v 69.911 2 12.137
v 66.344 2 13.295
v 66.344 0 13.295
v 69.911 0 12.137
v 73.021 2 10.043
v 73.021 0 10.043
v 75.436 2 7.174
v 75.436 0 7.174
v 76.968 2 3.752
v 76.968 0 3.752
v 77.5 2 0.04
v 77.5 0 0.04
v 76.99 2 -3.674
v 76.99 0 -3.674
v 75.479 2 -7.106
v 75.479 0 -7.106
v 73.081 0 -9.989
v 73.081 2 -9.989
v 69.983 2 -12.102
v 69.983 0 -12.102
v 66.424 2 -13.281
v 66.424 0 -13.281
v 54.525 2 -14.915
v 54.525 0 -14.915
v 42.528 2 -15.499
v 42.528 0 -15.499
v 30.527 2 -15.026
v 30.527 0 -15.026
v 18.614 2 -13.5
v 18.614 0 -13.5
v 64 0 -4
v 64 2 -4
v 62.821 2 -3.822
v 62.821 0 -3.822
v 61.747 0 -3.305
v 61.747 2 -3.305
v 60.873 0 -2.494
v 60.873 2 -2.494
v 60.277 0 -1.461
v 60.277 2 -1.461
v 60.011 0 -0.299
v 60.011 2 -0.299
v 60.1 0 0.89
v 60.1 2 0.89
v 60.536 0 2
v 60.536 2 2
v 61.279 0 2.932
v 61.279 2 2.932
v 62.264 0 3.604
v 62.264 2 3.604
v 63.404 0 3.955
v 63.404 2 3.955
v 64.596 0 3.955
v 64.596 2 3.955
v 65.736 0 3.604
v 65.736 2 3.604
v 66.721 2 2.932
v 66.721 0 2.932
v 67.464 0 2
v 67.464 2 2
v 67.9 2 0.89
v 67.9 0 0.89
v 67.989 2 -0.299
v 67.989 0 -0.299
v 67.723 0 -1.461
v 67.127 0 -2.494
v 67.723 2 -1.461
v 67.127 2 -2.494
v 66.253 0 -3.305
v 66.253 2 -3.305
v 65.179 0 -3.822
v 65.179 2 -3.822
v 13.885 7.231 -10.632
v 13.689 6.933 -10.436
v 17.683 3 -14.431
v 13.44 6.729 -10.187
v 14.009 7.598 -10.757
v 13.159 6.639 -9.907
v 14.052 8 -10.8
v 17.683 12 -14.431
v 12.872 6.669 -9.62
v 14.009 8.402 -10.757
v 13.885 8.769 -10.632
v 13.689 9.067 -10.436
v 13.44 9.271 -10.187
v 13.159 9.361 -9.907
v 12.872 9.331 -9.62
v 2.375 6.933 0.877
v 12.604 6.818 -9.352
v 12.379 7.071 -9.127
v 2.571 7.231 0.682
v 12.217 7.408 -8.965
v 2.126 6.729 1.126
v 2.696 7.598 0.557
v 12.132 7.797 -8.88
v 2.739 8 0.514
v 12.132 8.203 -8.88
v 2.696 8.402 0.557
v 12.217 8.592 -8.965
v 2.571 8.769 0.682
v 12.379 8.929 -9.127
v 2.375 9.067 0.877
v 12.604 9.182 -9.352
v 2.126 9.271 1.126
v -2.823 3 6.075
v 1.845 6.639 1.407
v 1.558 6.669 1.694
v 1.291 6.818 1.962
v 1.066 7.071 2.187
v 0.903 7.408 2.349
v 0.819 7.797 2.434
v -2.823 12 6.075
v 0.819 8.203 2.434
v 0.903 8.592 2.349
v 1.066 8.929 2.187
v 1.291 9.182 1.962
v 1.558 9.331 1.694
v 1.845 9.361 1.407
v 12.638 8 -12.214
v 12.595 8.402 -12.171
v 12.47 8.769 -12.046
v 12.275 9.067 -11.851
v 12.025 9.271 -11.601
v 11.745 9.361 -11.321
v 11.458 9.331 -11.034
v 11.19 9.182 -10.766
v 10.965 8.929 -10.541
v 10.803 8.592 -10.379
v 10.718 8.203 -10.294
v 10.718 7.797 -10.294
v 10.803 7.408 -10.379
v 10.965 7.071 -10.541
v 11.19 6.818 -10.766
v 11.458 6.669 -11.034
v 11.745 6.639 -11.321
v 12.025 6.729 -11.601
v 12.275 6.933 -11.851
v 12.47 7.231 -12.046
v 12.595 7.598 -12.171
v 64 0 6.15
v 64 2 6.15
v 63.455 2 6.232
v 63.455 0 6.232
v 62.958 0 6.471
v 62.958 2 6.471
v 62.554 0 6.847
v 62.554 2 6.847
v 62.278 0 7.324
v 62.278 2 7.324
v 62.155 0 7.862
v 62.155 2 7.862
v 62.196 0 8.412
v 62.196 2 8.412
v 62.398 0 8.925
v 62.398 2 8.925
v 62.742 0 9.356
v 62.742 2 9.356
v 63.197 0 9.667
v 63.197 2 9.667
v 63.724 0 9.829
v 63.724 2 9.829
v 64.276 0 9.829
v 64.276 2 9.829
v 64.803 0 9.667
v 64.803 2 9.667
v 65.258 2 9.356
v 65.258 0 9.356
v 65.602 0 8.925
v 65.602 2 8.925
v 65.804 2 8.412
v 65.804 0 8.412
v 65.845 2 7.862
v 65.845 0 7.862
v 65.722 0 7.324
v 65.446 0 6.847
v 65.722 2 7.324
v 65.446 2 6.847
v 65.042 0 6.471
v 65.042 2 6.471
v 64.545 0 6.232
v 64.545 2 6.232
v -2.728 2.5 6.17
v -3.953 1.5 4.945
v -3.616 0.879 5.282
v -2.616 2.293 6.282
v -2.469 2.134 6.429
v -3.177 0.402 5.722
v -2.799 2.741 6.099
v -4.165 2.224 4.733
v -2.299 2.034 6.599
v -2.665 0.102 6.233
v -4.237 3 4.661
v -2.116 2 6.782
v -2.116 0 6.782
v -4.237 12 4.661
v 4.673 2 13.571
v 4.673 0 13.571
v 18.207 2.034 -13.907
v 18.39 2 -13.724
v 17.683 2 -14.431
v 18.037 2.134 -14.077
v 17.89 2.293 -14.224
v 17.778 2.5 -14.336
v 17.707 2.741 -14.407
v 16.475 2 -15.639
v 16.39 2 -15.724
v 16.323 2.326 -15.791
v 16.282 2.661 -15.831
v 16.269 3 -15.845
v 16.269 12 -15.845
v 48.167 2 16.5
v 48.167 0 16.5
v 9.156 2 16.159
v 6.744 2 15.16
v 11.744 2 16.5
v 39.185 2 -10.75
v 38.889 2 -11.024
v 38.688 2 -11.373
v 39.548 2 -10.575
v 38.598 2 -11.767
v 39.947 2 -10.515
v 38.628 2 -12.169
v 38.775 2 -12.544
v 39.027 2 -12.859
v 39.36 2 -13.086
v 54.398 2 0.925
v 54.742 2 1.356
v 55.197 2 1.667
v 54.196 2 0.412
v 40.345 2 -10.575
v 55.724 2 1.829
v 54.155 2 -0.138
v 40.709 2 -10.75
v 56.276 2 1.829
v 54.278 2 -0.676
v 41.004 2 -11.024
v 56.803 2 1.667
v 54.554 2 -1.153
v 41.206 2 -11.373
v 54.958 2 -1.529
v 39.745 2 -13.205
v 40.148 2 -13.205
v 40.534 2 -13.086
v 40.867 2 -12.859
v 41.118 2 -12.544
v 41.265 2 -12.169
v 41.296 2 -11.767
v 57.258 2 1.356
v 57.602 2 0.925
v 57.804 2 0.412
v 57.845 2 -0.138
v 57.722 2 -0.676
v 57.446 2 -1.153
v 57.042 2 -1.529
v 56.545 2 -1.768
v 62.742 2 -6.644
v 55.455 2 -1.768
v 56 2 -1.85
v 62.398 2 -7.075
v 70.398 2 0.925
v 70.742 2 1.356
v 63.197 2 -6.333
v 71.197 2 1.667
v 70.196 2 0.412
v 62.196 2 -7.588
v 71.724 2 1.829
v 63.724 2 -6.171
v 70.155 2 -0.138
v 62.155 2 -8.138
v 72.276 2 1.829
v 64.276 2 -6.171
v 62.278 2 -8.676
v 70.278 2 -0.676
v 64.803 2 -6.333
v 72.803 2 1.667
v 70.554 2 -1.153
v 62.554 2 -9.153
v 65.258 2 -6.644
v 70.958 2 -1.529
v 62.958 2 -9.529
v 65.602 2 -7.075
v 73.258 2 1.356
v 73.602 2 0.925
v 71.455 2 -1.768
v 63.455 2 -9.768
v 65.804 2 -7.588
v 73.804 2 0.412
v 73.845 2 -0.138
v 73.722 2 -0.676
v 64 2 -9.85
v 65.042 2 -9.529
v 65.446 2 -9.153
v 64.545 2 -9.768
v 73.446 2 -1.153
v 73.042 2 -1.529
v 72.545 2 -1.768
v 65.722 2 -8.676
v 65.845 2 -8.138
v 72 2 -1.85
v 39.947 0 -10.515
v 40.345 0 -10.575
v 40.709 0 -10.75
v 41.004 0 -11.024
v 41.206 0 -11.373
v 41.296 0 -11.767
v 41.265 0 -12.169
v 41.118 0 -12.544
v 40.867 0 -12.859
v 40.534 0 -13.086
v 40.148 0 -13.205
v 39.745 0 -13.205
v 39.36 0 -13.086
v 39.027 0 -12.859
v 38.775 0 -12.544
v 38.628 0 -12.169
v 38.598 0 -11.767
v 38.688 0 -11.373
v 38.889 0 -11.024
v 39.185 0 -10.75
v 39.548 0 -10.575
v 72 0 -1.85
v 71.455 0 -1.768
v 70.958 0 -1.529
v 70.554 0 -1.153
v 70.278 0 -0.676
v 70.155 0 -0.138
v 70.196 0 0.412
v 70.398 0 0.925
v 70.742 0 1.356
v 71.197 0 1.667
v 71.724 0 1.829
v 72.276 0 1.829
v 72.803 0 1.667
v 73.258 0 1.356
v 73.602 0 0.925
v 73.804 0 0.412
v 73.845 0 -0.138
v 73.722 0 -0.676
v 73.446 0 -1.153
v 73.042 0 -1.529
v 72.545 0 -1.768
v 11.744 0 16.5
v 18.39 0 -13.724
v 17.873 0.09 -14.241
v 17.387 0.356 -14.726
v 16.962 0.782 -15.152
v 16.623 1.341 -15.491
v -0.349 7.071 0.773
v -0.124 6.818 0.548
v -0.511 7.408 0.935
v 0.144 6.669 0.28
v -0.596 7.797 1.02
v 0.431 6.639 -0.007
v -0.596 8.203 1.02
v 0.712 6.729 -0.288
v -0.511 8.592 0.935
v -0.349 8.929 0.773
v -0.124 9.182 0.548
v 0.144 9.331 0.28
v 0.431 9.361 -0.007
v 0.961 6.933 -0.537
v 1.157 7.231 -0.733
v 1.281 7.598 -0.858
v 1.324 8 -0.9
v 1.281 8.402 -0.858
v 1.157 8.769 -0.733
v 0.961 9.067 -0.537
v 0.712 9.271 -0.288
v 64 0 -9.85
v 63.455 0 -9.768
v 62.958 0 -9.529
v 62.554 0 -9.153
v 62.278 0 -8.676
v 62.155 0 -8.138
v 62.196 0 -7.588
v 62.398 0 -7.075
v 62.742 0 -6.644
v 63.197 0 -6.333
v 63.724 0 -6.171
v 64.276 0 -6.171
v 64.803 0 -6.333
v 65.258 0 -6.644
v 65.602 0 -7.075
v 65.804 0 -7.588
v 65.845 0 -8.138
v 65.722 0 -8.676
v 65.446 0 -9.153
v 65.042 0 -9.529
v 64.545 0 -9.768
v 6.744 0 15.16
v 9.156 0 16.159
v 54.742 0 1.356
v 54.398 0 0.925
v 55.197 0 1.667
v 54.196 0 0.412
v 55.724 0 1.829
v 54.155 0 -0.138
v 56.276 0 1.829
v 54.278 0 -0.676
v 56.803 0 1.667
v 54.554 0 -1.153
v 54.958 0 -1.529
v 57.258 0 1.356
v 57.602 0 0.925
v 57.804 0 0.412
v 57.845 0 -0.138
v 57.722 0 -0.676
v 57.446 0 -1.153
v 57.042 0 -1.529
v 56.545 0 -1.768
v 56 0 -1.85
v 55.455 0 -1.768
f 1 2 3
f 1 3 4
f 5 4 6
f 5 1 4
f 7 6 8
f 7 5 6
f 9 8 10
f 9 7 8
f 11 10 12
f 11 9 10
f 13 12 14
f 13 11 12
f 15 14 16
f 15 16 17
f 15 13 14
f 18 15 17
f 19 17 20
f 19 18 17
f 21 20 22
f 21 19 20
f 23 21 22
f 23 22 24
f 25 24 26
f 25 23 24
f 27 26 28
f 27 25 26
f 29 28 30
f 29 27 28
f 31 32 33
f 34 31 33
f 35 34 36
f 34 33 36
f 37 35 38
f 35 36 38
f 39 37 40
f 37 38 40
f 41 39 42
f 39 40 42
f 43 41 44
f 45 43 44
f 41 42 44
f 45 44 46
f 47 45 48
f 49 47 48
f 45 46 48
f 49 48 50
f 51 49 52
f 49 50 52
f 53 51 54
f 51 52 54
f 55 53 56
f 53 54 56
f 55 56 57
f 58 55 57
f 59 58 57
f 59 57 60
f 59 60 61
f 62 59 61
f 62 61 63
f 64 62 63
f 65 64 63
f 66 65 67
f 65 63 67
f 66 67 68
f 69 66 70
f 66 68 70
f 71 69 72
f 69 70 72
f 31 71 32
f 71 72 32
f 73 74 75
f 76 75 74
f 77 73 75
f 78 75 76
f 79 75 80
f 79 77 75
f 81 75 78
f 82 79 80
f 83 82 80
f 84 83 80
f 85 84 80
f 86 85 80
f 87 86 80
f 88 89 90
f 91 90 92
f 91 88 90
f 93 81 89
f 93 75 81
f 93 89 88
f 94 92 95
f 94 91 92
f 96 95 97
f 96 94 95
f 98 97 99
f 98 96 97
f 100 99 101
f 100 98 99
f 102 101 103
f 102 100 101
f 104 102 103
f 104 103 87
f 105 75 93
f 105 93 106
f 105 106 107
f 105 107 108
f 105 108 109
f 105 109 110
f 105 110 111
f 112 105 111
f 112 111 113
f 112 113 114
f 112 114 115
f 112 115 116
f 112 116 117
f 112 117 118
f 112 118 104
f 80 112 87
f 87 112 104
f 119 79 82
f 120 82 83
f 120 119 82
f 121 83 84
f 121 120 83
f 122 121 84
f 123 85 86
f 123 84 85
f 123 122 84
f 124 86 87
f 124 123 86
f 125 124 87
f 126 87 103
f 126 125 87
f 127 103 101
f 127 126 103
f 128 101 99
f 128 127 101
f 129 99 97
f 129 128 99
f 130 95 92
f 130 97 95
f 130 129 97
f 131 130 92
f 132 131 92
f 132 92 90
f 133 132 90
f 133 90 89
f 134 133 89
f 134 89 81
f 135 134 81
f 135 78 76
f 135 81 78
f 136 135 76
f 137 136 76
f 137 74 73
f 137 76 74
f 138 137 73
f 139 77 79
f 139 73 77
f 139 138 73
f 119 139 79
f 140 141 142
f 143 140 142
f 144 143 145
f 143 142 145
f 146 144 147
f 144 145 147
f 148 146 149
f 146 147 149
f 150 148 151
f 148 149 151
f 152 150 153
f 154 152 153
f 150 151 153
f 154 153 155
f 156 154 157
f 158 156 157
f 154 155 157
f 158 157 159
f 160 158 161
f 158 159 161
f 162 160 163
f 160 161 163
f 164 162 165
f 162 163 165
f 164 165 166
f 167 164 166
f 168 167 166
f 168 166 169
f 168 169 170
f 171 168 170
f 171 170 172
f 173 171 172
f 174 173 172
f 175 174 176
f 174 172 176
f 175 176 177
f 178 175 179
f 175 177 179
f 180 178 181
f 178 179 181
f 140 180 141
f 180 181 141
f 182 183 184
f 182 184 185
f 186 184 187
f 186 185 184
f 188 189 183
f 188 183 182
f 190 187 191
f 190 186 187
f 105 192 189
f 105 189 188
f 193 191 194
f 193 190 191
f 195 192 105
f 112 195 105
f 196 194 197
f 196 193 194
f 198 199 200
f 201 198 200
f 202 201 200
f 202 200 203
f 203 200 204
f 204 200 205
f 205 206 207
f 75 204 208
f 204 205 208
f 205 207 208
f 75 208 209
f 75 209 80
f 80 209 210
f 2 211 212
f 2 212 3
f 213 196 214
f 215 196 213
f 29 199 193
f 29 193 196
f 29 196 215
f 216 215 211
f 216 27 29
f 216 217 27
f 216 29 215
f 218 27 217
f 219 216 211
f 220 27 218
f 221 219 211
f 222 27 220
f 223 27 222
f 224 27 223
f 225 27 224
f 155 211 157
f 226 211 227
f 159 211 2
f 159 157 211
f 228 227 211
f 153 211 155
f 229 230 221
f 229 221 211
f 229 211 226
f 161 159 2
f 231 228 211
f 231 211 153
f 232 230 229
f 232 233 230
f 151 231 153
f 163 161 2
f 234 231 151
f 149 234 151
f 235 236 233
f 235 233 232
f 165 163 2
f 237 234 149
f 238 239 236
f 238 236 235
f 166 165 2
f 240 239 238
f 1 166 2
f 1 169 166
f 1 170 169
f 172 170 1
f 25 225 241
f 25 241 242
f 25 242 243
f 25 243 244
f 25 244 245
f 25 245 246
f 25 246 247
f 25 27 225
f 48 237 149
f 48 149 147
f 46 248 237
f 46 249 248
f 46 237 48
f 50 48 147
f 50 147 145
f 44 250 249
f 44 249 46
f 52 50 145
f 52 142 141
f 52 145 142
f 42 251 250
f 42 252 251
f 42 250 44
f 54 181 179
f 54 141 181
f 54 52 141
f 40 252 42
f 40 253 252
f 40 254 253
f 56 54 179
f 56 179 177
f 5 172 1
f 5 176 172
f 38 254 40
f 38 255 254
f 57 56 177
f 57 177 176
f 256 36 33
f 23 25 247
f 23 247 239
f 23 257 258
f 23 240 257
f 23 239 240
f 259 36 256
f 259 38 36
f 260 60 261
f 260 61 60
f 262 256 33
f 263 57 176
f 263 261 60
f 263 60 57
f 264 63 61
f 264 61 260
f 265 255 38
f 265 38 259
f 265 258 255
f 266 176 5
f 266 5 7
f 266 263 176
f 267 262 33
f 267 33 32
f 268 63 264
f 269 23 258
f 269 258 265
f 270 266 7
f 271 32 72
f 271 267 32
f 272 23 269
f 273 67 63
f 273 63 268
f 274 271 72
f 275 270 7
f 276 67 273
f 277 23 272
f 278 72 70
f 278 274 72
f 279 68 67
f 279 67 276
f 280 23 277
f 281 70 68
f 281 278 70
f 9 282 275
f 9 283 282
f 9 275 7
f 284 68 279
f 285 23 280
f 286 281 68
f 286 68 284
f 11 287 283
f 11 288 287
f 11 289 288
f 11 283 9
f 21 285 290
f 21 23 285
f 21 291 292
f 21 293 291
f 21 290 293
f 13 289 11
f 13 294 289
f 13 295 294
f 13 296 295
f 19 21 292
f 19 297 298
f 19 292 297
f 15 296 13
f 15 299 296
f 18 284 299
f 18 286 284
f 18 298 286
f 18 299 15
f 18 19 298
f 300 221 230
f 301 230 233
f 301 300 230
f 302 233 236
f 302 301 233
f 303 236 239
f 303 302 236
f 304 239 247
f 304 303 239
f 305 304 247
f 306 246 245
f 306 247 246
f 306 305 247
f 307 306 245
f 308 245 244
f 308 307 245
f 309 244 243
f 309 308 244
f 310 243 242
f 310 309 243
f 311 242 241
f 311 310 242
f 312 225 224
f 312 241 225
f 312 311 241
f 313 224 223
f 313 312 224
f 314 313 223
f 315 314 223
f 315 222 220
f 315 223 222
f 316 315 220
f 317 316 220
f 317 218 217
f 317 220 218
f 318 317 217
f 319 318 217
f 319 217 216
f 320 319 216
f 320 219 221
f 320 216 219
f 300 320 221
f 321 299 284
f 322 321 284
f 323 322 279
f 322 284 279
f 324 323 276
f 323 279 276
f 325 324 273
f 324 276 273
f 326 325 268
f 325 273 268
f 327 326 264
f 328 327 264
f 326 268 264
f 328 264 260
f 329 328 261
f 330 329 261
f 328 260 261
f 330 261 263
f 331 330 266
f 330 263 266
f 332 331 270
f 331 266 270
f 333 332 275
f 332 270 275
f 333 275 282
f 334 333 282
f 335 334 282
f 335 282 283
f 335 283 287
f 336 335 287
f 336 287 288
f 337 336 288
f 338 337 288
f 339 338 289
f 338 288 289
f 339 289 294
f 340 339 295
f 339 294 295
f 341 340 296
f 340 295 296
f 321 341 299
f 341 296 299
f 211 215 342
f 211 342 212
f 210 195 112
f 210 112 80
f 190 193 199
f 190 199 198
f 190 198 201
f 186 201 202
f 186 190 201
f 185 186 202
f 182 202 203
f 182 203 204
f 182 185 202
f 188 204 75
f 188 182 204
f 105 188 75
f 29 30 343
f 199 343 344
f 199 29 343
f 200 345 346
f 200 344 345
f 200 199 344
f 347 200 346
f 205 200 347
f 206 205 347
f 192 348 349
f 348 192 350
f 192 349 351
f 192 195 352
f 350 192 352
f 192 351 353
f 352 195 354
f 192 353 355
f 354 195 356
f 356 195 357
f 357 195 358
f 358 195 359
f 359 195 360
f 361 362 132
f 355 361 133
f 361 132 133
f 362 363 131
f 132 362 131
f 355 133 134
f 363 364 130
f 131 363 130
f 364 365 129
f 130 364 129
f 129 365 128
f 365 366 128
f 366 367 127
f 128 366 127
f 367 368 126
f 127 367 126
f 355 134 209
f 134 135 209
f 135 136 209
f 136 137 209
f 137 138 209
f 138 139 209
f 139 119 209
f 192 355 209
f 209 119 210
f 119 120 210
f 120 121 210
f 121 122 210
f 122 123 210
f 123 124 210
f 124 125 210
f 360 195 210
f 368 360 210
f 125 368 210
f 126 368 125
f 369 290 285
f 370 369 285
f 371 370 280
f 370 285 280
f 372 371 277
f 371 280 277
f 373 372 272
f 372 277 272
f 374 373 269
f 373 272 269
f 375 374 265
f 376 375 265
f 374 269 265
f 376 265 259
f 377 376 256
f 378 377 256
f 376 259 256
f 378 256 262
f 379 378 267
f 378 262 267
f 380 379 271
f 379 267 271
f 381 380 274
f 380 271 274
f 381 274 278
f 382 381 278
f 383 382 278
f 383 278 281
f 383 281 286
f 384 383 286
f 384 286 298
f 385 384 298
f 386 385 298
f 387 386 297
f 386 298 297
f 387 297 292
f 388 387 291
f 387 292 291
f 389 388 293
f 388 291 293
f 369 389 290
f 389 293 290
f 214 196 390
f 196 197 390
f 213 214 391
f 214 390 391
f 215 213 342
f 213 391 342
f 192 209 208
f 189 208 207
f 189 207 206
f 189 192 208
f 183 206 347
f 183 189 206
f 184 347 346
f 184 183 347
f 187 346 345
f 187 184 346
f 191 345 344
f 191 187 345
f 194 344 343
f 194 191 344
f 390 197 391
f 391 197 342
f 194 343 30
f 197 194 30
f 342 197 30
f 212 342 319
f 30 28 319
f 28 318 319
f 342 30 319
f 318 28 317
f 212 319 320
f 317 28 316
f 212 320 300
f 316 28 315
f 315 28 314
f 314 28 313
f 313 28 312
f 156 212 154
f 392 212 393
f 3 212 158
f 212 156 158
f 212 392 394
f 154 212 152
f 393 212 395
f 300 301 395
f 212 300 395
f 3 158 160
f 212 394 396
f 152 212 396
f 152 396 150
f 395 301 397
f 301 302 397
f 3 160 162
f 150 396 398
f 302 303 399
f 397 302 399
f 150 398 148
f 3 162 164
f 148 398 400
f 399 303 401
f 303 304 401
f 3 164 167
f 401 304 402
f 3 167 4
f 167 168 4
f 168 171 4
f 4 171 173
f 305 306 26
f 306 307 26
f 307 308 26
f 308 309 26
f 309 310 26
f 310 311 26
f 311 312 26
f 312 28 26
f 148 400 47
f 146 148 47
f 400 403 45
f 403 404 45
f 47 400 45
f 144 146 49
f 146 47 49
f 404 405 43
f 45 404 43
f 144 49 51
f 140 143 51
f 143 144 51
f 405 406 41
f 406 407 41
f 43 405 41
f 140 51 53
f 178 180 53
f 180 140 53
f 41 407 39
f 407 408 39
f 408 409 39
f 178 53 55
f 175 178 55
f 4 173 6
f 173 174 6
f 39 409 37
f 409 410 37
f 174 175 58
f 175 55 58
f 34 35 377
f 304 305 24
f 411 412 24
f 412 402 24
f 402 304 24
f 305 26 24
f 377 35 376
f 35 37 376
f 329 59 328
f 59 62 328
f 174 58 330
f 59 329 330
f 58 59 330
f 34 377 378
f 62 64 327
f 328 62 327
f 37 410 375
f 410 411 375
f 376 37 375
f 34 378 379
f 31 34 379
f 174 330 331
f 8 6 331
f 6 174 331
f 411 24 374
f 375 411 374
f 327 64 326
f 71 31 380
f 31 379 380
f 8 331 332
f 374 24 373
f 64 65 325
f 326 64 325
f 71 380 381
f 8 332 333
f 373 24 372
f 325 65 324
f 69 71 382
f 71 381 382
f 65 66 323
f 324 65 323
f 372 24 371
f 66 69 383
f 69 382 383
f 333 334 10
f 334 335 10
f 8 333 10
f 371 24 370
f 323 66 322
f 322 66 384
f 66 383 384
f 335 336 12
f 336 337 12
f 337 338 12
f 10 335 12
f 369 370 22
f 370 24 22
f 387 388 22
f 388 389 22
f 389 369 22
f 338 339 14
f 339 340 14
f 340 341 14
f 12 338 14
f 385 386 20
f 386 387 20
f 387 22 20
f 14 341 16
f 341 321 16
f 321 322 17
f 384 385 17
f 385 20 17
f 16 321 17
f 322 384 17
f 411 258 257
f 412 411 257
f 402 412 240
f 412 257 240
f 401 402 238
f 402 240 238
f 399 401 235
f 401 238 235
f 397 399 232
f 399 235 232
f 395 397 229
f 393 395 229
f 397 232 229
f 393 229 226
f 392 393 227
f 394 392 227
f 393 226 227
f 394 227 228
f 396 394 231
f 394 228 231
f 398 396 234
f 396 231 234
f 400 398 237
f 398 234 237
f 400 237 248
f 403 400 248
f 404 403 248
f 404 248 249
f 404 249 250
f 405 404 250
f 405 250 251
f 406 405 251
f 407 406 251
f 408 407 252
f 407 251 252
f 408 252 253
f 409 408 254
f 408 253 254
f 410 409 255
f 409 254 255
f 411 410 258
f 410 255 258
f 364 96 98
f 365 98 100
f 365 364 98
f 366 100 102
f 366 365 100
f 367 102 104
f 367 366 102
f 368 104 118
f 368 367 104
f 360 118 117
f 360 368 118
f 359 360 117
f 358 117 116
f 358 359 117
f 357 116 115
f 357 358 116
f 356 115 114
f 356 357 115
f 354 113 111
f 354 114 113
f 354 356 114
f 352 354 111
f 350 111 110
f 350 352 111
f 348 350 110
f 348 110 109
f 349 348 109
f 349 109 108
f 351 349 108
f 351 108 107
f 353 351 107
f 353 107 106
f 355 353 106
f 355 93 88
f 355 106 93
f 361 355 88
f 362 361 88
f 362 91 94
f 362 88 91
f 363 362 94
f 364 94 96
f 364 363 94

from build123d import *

# Parameters (mm, degrees)
SKETCH1_R                  = 1.85
SKETCH1_R_2                = 4
BOSS_EXTRUDE1_DEPTH        = 2
BOSS_EXTRUDE3_DEPTH        = 10
SKETCH12_R                 = 1.36525
CUT_EXTRUDE2_DEPTH         = 3
SKETCH14_R                 = 1.35255
CUT_EXTRUDE3_DEPTH         = 6
FILLET1_R                  = 10
FLATTEN_BENDS1_START       = 2
FLATTEN_BENDS1_DEPTH       = 10
FLATTEN_BENDS1_2_OUTLINE_R = 1.36525
FLATTEN_BENDS1_2_DEPTH     = 2
PROCESS_BENDS1_START       = -8.401979777
PROCESS_BENDS1_OUTLINE_W   = 29
PROCESS_BENDS1_OUTLINE_H   = 2
PROCESS_BENDS1_DEPTH       = 8.701769682
PROCESS_BENDS1_START_2     = 0.591569905
PROCESS_BENDS1_2_OUTLINE_W = 29
PROCESS_BENDS1_2_OUTLINE_H = 10
PROCESS_BENDS1_2_OUTLINE_R = 1.36525
PROCESS_BENDS1_2_DEPTH     = 1.70822
PROCESS_BENDS1_START_3     = 0.299789905
PROCESS_BENDS1_3_OUTLINE_W = 29
PROCESS_BENDS1_3_OUTLINE_H = 10
PROCESS_BENDS1_3_OUTLINE_R = 1.36525
PROCESS_BENDS1_3_DEPTH     = 3
PROCESS_BENDS1_START_4     = -6.292093187
PROCESS_BENDS1_4_DEPTH     = 29


with BuildPart() as part:
    # Sketch1 → Boss-Extrude1 (new body)
    with BuildSketch(Plane(origin=(0, 2, 0), x_dir=(1, 0, 0), z_dir=(0, 1, 0))):
        with BuildLine():
            Line((16.268898369, 15.844931419), (-4.237198285, -4.661165235))
            Line((-4.237198285, -4.661165235), (7.60163648, -16.5))
            Line((7.60163648, -16.5), (48.167251499, -16.5))
            Line((48.167251499, -16.5), (66.344250399, -13.294904666))
            ThreePointArc((66.344250399, -13.294904666), (77.499939542, -0.040402458), (66.423785357, 13.280634945))
            ThreePointArc((66.423785357, 13.280634945), (42.528480772, 15.498562339), (18.613829789, 13.5))
            Line((18.613829789, 13.5), (16.268898369, 15.844931419))
        make_face()
        with Locations(Location((56, 0, 0), (0, 0, 90))):
            Circle(SKETCH1_R, mode=Mode.SUBTRACT)
        with Locations(Location((64, -8, 0), (0, 0, 90))):
            Circle(SKETCH1_R, mode=Mode.SUBTRACT)
        with Locations(Location((72, 0, 0), (0, 0, 90))):
            Circle(SKETCH1_R, mode=Mode.SUBTRACT)
        with Locations(Location((64, 8, 0), (0, 0, 90))):
            Circle(SKETCH1_R, mode=Mode.SUBTRACT)
        with Locations(Location((64, 0, 0), (0, 0, 90))):
            Circle(SKETCH1_R_2, mode=Mode.SUBTRACT)
    extrude(amount=-BOSS_EXTRUDE1_DEPTH)

    # Sketch5 → Boss-Extrude3 (add)
    with BuildSketch(Plane(origin=(0, 2, 0), x_dir=(1, 0, 0), z_dir=(0, 1, 0))):
        Polygon((16.268898369, 15.844931419), (-4.237198285, -4.661165235), (-2.822984723, -6.075378798), (17.683111932, 14.430717857), align=None)
    extrude(amount=BOSS_EXTRUDE3_DEPTH)

    # Sketch12 → Cut-Extrude2 (cut)
    with BuildSketch(Plane(origin=(0.211983475, 0, 0.211983475), x_dir=(-0.7071067811865475, 0, 0.7071067811865477), z_dir=(-0.7071067811865477, 0, -0.7071067811865475))):
        with Locations((-16.207906813, 8)):
            Circle(SKETCH12_R)
        with Locations((-0.207906813, 8)):
            Circle(SKETCH12_R)
    extrude(amount=-CUT_EXTRUDE2_DEPTH, mode=Mode.SUBTRACT)

    # Sketch14 → Cut-Extrude3 (cut)
    with BuildSketch(Plane(origin=(0, 0, 0), x_dir=(1, 0, 0), z_dir=(0, 1, 0))):
        with Locations(Location((39.946755384, 11.867587507, 0), (0, 0, 270))):
            Circle(SKETCH14_R)
    extrude(amount=CUT_EXTRUDE3_DEPTH, mode=Mode.SUBTRACT)

    # Fillet1
    fillet1_edges = [part.edges().sort_by_distance(p)[0] for p in [
        (7.60163648, 1, 16.5),
    ]]
    fillet(fillet1_edges, radius=FILLET1_R)

    # Flatten-Bends1: read off the stored shape, not the designer's step
    # Flatten-Bends1 outline → Flatten-Bends1 (cut)
    with BuildSketch(Plane(origin=(0, 0, 0), x_dir=(1, 0, 0), z_dir=(0, 1, 0)).offset(FLATTEN_BENDS1_START)):
        Polygon((17.683111932, 14.430717857), (16.479779049, 15.634050739), (16.268898369, 15.844931419), (-4.237198285, -4.661165235), (-4.026317605, -4.872045915), (-2.822984722, -6.075378798), align=None)
    extrude(amount=FLATTEN_BENDS1_DEPTH, mode=Mode.SUBTRACT)

    # Flatten-Bends1 2 outline → Flatten-Bends1 2 (add)
    with BuildSketch(Plane(origin=(0, 0, 0), x_dir=(1, 0, 0), z_dir=(0, 1, 0))):
        Polygon((-4.237198285, -4.661165235), (16.268898369, 15.844931419), (10.115818019, 21.99801177), (-10.390278636, 1.491915115), align=None)
        with Locations((-2.965657433, 3.259682068)):
            Circle(FLATTEN_BENDS1_2_OUTLINE_R, mode=Mode.SUBTRACT)
        with Locations((8.348051066, 14.573390567)):
            Circle(FLATTEN_BENDS1_2_OUTLINE_R, mode=Mode.SUBTRACT)
    extrude(amount=FLATTEN_BENDS1_2_DEPTH)

    # Process-Bends1: read off the stored shape, not the designer's step
    # Process-Bends1 outline → Process-Bends1 (cut)
    with BuildSketch(Plane(origin=(0, 0, 0), x_dir=(0.7071067811865471, 0, -0.707106781186548), z_dir=(0.707106781186548, 0, 0.707106781186547)).offset(PROCESS_BENDS1_START)):
        with Locations((8.207906813, 1)):
            Rectangle(PROCESS_BENDS1_OUTLINE_W, PROCESS_BENDS1_OUTLINE_H)
    extrude(amount=PROCESS_BENDS1_DEPTH, mode=Mode.SUBTRACT)

    # Process-Bends1 2 outline → Process-Bends1 2 (add)
    with BuildSketch(Plane(origin=(0, 0, 0), x_dir=(0.7071067811865471, 0, -0.707106781186548), z_dir=(0.707106781186548, 0, 0.707106781186547)).offset(PROCESS_BENDS1_START_2)):
        with Locations((8.207906813, 7)):
            Rectangle(PROCESS_BENDS1_2_OUTLINE_W, PROCESS_BENDS1_2_OUTLINE_H)
        with Locations((0.207906813, 8)):
            Circle(PROCESS_BENDS1_2_OUTLINE_R, mode=Mode.SUBTRACT)
        with Locations((16.207906813, 8)):
            Circle(PROCESS_BENDS1_2_OUTLINE_R, mode=Mode.SUBTRACT)
    extrude(amount=PROCESS_BENDS1_2_DEPTH)

    # Process-Bends1 3 outline → Process-Bends1 3 (add)
    with BuildSketch(Plane(origin=(0, 0, 0), x_dir=(0.7071067811865471, 0, -0.707106781186548), z_dir=(0.707106781186548, 0, 0.707106781186547)).offset(PROCESS_BENDS1_START_3)):
        with Locations((8.207906813, 7)):
            Rectangle(PROCESS_BENDS1_3_OUTLINE_W, PROCESS_BENDS1_3_OUTLINE_H)
        with Locations((0.207906813, 8)):
            Circle(PROCESS_BENDS1_3_OUTLINE_R, mode=Mode.SUBTRACT)
        with Locations((16.207906813, 8)):
            Circle(PROCESS_BENDS1_3_OUTLINE_R, mode=Mode.SUBTRACT)
    extrude(amount=PROCESS_BENDS1_3_DEPTH)

    # Process-Bends1 4 outline → Process-Bends1 4 (cut)
    with BuildSketch(Plane(origin=(0, 0, 0), x_dir=(0.7071067811865474, 0, 0.7071067811865477), z_dir=(0.7071067811865476, 0, -0.7071067811865476)).offset(PROCESS_BENDS1_START_4)):
        with BuildLine():
            ThreePointArc((3.299789905, -2), (2.592683124, -2.292893219), (2.299789905, -3))
            Line((2.299789905, -3), (2.299789905, -12))
            Line((2.299789905, -12), (3.299789905, -12))
            Line((3.299789905, -12), (3.299789905, -2))
        make_face()
        with BuildLine():
            Line((0.299789905, 0), (0.299789905, -3))
            ThreePointArc((0.299789905, -3), (1.178469562, -0.878679657), (3.299789905, 0))
            Line((3.299789905, 0), (0.299789905, 0))
        make_face()
    extrude(amount=PROCESS_BENDS1_4_DEPTH, mode=Mode.SUBTRACT)


solid = part.part
